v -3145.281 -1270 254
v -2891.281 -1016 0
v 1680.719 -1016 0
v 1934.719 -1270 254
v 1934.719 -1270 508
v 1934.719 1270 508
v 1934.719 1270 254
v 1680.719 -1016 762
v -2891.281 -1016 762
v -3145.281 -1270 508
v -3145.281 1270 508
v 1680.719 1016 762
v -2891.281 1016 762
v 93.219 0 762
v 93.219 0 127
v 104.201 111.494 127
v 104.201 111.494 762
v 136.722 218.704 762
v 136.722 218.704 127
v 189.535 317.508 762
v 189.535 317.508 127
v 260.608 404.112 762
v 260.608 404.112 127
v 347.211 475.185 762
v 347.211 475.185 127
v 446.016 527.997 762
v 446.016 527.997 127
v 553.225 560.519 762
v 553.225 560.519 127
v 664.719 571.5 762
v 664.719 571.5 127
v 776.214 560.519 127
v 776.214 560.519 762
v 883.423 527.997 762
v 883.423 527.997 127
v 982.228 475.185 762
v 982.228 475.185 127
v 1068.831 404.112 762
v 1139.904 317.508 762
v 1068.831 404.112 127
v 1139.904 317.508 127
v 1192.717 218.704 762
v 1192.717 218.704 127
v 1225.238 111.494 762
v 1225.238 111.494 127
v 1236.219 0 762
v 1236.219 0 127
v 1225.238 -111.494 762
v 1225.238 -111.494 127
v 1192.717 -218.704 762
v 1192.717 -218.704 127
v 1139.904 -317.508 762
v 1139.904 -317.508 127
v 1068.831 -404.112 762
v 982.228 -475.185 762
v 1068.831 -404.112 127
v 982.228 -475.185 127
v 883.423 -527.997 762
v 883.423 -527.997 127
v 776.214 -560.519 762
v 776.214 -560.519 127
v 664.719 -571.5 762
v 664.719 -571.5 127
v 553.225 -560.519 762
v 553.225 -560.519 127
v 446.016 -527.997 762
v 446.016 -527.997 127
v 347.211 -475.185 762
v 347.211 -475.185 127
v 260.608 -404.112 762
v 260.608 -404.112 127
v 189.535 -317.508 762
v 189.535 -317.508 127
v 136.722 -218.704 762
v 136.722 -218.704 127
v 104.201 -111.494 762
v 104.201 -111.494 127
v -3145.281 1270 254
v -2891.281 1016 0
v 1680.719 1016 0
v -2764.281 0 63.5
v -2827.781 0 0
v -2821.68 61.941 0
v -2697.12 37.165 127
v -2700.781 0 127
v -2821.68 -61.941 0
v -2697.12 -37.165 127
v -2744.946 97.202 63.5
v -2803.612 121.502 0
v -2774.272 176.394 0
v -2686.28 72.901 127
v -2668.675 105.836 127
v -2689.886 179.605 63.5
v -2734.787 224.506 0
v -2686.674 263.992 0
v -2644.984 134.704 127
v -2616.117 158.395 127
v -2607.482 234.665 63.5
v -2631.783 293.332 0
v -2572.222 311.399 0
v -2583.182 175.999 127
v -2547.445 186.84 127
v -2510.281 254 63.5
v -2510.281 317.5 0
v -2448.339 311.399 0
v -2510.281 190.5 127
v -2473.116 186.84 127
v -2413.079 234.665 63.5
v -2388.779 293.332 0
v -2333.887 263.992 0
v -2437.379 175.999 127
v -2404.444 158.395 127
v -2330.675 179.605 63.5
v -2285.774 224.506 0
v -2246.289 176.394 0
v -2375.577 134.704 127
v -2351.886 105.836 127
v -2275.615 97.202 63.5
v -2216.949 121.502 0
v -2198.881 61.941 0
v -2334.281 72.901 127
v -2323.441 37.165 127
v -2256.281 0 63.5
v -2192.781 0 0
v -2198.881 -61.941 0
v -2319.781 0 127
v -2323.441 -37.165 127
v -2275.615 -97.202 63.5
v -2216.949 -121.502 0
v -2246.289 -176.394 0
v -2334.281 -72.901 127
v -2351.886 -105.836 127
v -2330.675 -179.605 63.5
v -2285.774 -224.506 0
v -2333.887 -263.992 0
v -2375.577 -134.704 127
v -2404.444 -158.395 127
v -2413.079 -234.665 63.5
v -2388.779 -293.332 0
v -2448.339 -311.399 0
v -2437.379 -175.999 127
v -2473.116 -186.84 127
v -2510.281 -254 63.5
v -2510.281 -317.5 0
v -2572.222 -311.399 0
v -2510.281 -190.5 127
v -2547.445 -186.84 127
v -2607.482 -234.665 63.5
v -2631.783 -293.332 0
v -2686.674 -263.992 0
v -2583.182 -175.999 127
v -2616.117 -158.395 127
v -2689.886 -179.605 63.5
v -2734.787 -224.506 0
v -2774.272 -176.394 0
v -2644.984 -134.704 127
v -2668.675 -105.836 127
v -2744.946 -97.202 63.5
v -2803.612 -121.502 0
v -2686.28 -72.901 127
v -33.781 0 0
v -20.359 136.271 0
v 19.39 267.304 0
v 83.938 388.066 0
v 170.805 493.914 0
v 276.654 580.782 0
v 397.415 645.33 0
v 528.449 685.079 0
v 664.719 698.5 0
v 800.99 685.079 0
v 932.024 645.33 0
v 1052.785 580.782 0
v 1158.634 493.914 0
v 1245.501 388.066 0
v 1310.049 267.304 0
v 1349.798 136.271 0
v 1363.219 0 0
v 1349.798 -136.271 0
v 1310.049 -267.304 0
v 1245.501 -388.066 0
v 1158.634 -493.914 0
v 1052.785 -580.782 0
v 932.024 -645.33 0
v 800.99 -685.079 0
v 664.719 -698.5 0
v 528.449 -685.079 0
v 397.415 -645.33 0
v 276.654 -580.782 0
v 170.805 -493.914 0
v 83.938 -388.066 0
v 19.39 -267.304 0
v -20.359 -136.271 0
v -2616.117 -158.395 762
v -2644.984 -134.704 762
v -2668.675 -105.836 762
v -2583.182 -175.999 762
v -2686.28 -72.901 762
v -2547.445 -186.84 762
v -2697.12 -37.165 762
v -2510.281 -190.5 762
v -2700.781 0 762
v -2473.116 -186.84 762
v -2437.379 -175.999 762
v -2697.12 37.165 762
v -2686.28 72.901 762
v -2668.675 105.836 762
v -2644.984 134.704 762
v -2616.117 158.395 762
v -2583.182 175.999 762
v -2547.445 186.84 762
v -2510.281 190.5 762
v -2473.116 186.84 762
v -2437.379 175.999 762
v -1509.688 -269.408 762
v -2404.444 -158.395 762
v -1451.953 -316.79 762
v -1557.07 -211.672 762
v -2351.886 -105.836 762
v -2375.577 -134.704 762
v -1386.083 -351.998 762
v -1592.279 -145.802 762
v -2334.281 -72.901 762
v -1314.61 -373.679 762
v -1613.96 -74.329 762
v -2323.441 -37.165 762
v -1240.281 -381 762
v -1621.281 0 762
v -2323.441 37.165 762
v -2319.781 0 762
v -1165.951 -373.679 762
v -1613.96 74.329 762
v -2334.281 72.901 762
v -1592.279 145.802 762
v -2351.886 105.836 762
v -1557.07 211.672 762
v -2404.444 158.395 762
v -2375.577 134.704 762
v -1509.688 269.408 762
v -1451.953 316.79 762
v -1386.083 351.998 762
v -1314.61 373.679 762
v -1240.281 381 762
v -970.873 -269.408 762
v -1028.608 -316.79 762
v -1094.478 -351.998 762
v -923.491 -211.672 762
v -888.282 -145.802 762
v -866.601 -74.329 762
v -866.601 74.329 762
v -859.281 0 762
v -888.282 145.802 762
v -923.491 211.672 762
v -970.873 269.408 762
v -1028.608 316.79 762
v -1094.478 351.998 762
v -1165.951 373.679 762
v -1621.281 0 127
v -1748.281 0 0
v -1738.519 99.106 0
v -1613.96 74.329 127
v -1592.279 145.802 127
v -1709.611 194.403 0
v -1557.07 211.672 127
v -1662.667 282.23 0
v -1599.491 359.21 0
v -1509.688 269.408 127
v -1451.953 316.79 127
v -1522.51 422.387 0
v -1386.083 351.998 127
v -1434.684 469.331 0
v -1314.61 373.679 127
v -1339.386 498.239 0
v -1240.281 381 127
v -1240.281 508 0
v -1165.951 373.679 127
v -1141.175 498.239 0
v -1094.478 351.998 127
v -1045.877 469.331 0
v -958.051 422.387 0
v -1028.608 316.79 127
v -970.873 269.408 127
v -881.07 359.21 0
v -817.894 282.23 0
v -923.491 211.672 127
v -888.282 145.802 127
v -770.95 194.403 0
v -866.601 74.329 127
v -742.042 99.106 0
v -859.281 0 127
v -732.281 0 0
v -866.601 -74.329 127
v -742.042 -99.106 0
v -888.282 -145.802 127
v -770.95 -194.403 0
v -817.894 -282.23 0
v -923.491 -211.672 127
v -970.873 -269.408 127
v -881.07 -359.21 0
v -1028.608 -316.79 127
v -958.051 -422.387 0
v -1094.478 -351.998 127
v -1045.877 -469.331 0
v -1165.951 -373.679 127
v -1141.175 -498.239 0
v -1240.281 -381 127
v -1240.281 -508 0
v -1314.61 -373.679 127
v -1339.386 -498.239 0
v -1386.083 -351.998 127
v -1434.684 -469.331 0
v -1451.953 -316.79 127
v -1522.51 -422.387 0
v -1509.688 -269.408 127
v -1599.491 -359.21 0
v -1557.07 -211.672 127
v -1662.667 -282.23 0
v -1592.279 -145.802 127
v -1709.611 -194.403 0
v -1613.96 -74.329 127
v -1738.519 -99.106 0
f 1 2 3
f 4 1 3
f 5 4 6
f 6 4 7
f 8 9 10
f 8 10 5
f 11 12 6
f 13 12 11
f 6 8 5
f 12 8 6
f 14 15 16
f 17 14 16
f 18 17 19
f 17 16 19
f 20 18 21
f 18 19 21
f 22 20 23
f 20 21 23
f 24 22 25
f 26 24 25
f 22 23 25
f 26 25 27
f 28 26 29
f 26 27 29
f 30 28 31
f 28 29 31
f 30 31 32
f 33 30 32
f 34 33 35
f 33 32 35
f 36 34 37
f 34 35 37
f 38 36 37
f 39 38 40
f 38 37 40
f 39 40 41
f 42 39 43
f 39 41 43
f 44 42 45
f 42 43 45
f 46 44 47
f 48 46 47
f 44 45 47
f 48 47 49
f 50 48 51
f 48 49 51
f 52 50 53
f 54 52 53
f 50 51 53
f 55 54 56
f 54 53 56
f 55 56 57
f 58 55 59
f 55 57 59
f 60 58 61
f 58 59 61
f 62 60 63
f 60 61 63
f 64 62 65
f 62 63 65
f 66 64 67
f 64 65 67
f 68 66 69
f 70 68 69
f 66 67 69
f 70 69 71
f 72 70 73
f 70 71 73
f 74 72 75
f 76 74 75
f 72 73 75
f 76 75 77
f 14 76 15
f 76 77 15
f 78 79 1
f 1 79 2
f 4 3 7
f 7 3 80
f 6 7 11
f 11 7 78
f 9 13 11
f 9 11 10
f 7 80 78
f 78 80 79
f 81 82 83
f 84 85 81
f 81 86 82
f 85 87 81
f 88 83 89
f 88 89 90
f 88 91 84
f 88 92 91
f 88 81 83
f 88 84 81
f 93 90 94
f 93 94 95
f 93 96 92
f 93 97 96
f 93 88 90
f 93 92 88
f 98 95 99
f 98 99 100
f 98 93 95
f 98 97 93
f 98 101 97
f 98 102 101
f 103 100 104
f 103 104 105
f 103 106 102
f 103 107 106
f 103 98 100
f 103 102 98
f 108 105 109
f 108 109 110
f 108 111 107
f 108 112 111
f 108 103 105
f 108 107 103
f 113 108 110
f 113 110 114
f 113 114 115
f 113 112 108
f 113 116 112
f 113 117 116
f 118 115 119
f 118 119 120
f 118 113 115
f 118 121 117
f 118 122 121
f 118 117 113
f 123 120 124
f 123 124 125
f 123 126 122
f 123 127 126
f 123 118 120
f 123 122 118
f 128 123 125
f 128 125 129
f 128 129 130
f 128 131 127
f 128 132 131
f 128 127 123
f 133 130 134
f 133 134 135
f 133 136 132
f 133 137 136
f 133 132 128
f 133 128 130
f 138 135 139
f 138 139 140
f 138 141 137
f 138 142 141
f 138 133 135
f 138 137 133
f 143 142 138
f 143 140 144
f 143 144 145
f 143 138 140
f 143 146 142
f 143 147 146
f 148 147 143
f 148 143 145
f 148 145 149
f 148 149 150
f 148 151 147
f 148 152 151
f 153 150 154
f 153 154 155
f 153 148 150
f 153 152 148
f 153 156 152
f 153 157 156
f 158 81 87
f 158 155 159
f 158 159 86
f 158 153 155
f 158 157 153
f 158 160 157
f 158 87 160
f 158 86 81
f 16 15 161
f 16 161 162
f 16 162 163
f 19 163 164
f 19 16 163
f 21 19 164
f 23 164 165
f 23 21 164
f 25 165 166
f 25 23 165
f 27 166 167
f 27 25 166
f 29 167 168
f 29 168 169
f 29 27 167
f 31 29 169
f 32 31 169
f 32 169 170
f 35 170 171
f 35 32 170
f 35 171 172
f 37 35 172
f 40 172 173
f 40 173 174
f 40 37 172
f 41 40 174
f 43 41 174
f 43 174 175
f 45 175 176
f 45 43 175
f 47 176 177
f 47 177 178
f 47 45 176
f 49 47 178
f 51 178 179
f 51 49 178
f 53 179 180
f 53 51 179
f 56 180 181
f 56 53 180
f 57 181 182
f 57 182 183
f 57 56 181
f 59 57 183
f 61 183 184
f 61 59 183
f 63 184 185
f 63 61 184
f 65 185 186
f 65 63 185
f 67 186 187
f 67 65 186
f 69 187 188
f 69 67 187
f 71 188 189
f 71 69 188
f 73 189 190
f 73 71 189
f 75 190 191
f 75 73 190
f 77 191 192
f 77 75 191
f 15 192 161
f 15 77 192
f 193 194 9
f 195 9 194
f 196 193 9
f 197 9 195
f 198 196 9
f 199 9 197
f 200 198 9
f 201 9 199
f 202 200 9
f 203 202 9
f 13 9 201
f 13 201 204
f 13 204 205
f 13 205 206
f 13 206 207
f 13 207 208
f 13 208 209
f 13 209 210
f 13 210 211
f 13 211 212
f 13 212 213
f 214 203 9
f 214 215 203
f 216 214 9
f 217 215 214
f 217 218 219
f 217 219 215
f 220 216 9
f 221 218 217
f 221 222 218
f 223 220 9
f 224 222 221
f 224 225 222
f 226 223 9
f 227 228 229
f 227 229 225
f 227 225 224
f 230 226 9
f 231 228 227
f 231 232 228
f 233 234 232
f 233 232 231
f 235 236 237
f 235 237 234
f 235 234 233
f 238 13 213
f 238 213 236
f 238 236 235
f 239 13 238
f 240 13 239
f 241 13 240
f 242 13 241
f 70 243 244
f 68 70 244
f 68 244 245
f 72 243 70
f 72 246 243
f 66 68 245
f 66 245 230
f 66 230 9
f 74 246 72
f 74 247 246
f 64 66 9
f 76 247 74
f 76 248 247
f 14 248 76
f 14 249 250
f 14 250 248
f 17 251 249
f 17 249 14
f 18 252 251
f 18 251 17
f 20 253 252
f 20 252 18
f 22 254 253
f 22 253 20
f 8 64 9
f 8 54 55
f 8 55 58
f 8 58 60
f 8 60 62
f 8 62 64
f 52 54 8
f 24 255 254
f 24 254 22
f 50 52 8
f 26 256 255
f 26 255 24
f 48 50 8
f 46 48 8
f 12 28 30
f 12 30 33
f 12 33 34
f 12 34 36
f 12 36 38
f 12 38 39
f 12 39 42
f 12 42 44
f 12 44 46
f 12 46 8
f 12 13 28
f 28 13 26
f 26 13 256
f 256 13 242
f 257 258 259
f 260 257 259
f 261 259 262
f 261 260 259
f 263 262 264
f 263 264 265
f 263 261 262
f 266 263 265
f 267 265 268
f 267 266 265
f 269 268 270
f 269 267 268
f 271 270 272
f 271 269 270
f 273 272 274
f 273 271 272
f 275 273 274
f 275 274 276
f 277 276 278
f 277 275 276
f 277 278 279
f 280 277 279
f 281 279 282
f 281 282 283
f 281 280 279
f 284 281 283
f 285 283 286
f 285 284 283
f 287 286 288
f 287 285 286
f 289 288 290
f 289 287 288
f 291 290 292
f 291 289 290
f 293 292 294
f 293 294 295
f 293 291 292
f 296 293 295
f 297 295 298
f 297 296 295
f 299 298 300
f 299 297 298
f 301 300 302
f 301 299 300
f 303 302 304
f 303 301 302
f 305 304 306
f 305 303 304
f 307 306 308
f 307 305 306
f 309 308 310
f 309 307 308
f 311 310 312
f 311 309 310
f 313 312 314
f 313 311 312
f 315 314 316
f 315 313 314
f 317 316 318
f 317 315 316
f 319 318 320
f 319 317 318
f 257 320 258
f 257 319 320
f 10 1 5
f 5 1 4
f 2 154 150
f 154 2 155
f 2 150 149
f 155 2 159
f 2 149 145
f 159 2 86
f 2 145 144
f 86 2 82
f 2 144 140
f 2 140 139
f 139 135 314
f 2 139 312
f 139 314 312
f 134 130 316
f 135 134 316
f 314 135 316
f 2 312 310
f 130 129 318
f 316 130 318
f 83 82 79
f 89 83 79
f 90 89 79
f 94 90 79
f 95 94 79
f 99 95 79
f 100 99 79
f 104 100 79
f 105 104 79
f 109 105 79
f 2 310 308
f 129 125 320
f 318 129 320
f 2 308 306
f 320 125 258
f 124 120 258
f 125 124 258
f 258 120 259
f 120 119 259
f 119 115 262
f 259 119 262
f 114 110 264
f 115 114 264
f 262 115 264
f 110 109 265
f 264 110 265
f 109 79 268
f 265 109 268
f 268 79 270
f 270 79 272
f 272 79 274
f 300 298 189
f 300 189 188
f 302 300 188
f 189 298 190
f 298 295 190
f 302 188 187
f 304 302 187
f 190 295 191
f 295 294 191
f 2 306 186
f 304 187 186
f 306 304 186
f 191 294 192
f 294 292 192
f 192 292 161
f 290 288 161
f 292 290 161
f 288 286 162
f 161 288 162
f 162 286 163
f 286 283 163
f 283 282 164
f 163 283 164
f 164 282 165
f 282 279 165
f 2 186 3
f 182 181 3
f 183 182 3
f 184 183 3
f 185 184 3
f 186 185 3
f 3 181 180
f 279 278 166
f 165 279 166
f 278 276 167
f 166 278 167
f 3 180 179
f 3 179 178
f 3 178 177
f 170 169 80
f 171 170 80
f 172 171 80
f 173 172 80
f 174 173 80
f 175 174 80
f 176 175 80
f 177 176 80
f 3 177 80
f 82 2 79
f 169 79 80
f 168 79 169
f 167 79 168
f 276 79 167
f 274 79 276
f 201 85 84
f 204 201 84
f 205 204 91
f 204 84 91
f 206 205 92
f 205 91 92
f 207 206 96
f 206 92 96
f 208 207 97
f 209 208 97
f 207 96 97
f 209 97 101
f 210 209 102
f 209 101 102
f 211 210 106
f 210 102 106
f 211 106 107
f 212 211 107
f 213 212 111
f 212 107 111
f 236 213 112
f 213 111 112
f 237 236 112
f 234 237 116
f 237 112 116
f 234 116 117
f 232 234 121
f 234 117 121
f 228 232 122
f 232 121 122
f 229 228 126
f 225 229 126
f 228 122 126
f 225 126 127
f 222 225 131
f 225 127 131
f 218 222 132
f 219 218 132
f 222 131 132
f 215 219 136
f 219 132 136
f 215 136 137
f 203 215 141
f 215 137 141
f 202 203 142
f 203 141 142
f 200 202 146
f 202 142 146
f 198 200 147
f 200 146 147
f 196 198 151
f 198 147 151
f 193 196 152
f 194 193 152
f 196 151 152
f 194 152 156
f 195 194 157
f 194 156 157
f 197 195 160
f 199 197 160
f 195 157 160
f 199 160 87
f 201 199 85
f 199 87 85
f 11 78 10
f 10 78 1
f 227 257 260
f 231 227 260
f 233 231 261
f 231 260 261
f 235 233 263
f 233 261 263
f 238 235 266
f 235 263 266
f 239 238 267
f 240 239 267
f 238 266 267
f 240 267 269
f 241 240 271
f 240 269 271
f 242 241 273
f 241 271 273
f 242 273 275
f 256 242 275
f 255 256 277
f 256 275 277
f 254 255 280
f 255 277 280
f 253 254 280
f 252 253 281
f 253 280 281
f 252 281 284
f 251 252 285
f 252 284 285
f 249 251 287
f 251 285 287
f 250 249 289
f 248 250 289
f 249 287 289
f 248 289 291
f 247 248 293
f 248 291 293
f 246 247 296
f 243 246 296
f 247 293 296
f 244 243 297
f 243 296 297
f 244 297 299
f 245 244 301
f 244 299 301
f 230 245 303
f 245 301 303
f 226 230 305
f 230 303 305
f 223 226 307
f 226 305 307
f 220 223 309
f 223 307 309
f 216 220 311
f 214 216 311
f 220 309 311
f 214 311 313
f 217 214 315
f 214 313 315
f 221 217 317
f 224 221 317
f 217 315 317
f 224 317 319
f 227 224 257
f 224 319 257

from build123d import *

# Parameters (mm, degrees)
F1_DEPTH = 762
F2_SIZE  = 254
F3_SIZE  = 127


with BuildPart() as f1:
    # F0 (on Top) → F1 (new body)
    with BuildSketch(Plane.XY):
        with BuildLine():
            Line((-3145.280514, 0), (-3145.280514, -1270))
            Line((-3145.280514, -1270), (1934.719486, -1270))
            Line((1934.719486, -1270), (1934.719486, 0))
            Line((1934.719486, 0), (1236.219486, 0))
            ThreePointArc((1236.219486, 0), (664.719486, -571.5), (93.219486, 0))
            Line((93.219486, 0), (-859.280514, 0))
            ThreePointArc((-859.280514, 0), (-1240.280514, -381), (-1621.280514, 0))
            Line((-1621.280514, 0), (-2319.780514, 0))
            ThreePointArc((-2319.780514, 0), (-2510.280514, -190.5), (-2700.780514, 0))
            Line((-2700.780514, 0), (-3145.280514, 0))
        make_face()
        with BuildLine():
            Line((-3145.280514, 1270), (-3145.280514, 0))
            Line((-3145.280514, 0), (-2700.780514, 0))
            ThreePointArc((-2700.780514, 0), (-2510.280514, 190.5), (-2319.780514, 0))
            Line((-2319.780514, 0), (-1621.280514, 0))
            ThreePointArc((-1621.280514, 0), (-1240.280514, 381), (-859.280514, 0))
            Line((-859.280514, 0), (93.219486, 0))
            ThreePointArc((93.219486, 0), (664.719486, 571.5), (1236.219486, 0))
            Line((1236.219486, 0), (1934.719486, 0))
            Line((1934.719486, 0), (1934.719486, 1270))
            Line((1934.719486, 1270), (-3145.280514, 1270))
        make_face()
    extrude(amount=F1_DEPTH)

    # F2
    f2_edges = [f1.edges().sort_by_distance(p)[0] for p in [
        (-3145.280514, 0, 0),
        (-605.280514, 1270, 0),
        (1934.719486, 0, 0),
        (1934.719486, 0, 762),
        (-605.280514, -1270, 762),
        (-3145.280514, 0, 762),
        (-605.280514, 1270, 762),
        (-605.280514, -1270, 0),
    ]]
    chamfer(f2_edges, length=F2_SIZE)

    # F3
    f3_edges = [f1.edges().sort_by_distance(p)[0] for p in [
        (-2700.780514, 0, 0),
        (-1621.280514, 0, 0),
        (93.219486, 0, 0),
    ]]
    chamfer(f3_edges, length=F3_SIZE)


solid = f1.part
